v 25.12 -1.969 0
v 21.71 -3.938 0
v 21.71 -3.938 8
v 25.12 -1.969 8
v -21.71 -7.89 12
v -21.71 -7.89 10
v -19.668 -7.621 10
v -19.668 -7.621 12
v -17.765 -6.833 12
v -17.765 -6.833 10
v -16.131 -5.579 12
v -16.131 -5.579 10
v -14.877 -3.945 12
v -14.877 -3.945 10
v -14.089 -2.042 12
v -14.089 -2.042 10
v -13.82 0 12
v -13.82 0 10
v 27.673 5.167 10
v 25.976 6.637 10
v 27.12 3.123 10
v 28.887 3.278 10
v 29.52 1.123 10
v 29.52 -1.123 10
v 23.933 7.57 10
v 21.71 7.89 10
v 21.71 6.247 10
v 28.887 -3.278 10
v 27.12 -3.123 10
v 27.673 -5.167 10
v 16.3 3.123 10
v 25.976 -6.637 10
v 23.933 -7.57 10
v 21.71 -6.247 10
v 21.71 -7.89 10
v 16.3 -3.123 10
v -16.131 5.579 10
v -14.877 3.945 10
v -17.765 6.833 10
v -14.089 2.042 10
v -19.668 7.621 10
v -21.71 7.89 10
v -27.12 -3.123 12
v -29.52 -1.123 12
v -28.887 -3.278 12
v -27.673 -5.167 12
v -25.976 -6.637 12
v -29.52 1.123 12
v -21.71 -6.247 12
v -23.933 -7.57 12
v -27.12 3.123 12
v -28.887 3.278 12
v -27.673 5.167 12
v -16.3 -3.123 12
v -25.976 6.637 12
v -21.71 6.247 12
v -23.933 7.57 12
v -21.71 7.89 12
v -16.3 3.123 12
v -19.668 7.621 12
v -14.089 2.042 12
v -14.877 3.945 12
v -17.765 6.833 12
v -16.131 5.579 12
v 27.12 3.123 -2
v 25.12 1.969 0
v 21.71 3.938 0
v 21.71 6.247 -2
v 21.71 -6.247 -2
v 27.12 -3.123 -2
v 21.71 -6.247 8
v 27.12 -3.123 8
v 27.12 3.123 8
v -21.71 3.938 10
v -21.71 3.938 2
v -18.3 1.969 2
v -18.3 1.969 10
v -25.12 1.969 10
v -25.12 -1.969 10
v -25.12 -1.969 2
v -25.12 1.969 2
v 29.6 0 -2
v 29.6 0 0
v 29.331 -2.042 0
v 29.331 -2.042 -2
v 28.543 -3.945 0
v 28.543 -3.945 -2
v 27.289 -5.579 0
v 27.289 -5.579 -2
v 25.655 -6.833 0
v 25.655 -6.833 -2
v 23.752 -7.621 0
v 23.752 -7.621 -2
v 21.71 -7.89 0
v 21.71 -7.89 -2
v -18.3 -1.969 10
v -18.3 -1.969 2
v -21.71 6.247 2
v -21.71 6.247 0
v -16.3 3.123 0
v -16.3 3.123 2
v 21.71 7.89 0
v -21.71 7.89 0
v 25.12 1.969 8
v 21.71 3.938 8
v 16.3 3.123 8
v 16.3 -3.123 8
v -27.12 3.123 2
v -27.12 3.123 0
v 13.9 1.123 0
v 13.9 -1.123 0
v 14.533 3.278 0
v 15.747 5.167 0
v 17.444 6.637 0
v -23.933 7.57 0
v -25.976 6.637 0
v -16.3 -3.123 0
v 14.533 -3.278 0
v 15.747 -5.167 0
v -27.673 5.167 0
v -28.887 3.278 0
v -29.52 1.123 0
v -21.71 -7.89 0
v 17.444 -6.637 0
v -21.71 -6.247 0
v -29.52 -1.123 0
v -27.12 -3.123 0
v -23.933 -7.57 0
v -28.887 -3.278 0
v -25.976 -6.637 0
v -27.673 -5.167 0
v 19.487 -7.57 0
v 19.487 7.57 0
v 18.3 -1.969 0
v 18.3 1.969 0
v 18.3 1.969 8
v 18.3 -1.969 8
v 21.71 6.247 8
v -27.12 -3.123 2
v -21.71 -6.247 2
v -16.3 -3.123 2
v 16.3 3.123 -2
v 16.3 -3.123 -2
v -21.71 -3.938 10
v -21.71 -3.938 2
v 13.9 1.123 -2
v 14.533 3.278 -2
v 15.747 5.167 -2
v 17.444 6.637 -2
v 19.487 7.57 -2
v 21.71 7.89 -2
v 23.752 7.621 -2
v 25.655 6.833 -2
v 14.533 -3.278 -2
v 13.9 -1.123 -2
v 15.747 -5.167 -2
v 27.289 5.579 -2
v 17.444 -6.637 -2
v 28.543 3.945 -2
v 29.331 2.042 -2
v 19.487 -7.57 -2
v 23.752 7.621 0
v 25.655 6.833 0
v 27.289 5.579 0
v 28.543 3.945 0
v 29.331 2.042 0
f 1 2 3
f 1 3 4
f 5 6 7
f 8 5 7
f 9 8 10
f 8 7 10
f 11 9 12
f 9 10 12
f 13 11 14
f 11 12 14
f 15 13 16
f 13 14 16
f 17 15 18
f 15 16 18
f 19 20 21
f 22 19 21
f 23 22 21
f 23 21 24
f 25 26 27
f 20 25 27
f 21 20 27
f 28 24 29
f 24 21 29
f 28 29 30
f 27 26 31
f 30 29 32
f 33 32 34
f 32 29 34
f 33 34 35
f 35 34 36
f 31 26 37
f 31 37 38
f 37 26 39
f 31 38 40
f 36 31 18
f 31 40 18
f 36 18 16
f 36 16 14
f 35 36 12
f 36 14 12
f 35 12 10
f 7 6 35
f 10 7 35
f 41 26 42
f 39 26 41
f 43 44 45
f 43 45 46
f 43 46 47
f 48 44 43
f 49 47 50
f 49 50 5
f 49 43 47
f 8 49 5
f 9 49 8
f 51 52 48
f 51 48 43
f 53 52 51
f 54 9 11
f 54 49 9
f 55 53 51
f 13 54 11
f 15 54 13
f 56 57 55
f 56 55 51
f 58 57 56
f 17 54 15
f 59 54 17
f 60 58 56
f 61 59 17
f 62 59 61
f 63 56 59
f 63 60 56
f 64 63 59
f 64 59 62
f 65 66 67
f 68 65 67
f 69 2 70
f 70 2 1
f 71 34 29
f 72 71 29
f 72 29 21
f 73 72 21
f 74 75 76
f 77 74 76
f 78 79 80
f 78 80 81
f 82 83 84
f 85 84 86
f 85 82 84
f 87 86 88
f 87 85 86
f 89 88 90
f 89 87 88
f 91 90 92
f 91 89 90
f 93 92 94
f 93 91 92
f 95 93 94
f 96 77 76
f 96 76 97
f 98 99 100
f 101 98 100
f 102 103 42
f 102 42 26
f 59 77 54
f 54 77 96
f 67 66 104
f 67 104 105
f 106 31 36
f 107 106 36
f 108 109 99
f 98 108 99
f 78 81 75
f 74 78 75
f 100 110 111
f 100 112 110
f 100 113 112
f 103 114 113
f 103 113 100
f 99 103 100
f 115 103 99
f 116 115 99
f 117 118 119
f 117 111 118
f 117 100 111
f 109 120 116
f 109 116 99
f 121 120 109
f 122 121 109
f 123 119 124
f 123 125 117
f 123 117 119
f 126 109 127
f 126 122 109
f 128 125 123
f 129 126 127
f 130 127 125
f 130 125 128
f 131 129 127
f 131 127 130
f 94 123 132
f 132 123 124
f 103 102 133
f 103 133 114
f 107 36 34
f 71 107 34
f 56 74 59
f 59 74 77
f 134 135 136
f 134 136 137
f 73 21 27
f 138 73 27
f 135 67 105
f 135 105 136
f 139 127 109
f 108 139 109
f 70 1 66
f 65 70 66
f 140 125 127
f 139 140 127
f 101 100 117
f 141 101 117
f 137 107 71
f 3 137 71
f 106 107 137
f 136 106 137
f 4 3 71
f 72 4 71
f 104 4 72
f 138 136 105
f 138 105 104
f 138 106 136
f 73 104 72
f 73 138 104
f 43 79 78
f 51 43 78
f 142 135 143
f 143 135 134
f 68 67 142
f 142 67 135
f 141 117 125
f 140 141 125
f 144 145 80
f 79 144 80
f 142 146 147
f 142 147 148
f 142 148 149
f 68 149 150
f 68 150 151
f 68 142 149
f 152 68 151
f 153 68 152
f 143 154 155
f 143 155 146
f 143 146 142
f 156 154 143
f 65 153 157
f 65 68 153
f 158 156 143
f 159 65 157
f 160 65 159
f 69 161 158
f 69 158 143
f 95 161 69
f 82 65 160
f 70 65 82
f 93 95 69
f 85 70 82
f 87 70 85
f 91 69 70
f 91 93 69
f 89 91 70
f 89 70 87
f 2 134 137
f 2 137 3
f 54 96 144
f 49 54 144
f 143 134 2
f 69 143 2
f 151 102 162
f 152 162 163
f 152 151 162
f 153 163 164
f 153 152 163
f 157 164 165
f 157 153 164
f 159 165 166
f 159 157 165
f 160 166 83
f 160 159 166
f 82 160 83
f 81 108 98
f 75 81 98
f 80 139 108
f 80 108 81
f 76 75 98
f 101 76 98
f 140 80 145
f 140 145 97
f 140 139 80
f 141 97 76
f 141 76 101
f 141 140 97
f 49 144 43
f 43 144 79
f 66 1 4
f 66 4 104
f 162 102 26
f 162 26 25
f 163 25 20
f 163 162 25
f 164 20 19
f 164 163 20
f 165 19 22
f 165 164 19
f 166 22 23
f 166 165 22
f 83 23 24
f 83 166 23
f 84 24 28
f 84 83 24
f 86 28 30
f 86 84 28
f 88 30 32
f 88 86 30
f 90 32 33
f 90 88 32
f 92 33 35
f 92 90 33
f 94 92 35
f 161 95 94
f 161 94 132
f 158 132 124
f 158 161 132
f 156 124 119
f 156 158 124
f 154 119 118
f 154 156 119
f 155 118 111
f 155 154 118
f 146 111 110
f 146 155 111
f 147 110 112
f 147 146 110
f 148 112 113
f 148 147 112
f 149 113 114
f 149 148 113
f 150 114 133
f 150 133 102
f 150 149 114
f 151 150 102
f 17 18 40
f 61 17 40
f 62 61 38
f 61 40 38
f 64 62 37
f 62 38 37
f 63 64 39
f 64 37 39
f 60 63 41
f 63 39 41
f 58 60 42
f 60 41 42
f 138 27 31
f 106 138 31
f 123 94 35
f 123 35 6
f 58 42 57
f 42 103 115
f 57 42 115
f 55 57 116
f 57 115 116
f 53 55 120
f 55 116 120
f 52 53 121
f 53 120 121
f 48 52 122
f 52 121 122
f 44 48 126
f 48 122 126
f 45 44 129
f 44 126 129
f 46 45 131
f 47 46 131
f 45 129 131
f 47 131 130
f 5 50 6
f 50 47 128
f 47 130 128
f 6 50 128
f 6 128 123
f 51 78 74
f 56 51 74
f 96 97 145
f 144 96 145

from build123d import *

# Parameters (mm, degrees)
BOSS_EXTRU_1_DEPTH      = 10
BOSS_EXTRU_3_START      = 2
BOSS_EXTRU_3_DEPTH      = 2
BOSS_EXTRU_4_DEPTH      = 2
ENL_V_MAT_EXTRU_2_DEPTH = 2
ENL_V_MAT_EXTRU_3_DEPTH = 2
CHANFREIN1_SIZE         = 2


with BuildPart() as part:
    # Esquisse1 → Boss.-Extru.1 (new body)
    with BuildSketch(Plane(origin=(0, 0, 0), x_dir=(0, 1, 0), z_dir=(0, 0, 1))):
        with BuildLine():
            Line((-7.89, -21.71), (-7.89, 21.71))
            ThreePointArc((-7.89, 21.71), (0, 29.6), (7.89, 21.71))
            Line((7.89, 21.71), (7.89, -21.71))
            ThreePointArc((7.89, -21.71), (0, -29.6), (-7.89, -21.71))
        make_face()
        Polygon((-1.968764418, -18.3), (-3.937528836, -21.71), (-1.968764418, -25.12), (1.968764418, -25.12), (3.937528836, -21.71), (1.968764418, -18.3), align=None, mode=Mode.SUBTRACT)
        Polygon((1.968764418, 18.3), (-1.968764418, 18.3), (-3.937528836, 21.71), (-1.968764418, 25.12), (1.968764418, 25.12), (3.937528836, 21.71), align=None, mode=Mode.SUBTRACT)
    extrude(amount=BOSS_EXTRU_1_DEPTH)

    # Esquisse3 → Boss.-Extru.3 (add)
    with BuildSketch(Plane(origin=(0, 0, 0), x_dir=(1, 0, 0), z_dir=(0, 0, -1)).offset(BOSS_EXTRU_3_START)):
        with BuildLine():
            ThreePointArc((21.71, -7.89), (27.289072504, -5.579072504), (29.6, 0))
            ThreePointArc((29.6, 0), (27.289072504, 5.579072504), (21.71, 7.89))
            ThreePointArc((21.71, 7.89), (13.82, 0), (21.71, -7.89))
        make_face()
        Polygon((21.71, -3.937528836), (18.3, -1.968764418), (18.3, 1.968764418), (21.71, 3.937528836), (25.12, 1.968764418), (25.12, -1.968764418), align=None, mode=Mode.SUBTRACT)
    extrude(amount=-BOSS_EXTRU_3_DEPTH)

    # Esquisse4 → Boss.-Extru.4 (add)
    with BuildSketch(Plane.XY.offset(10)):
        with BuildLine():
            ThreePointArc((-21.71, -7.89), (-16.130927496, -5.579072504), (-13.82, 0))
            ThreePointArc((-13.82, 0), (-16.130927496, 5.579072504), (-21.71, 7.89))
            ThreePointArc((-21.71, 7.89), (-29.6, 0), (-21.71, -7.89))
        make_face()
        Polygon((-25.12, -1.968764418), (-25.12, 1.968764418), (-21.71, 3.937528836), (-18.3, 1.968764418), (-18.3, -1.968764418), (-21.71, -3.937528836), align=None, mode=Mode.SUBTRACT)
    extrude(amount=BOSS_EXTRU_4_DEPTH)

    # Esquisse5 → Enlèv. mat.-Extru.2 (cut)
    with BuildSketch(Plane(origin=(0, 0, 0), x_dir=(1, 0, 0), z_dir=(0, 0, -1))):
        Polygon((-16.3, -3.123464956), (-16.3, 3.123464956), (-21.71, 6.246929913), (-27.12, 3.123464956), (-27.12, -3.123464956), (-21.71, -6.246929913), align=None)
    extrude(amount=-ENL_V_MAT_EXTRU_2_DEPTH, mode=Mode.SUBTRACT)

    # Esquisse6 → Enlèv. mat.-Extru.3 (cut)
    with BuildSketch(Plane.XY.offset(10)):
        Polygon((27.12, -3.123464956), (27.12, 3.123464956), (21.71, 6.246929913), (16.3, 3.123464956), (16.3, -3.123464956), (21.71, -6.246929913), align=None)
    extrude(amount=-ENL_V_MAT_EXTRU_3_DEPTH, mode=Mode.SUBTRACT)

    # Chanfrein1
    chanfrein1_edges = [part.edges().sort_by_distance(p)[0] for p in [
        (20.005, 2.953146627, -2),
        (18.3, 0, -2),
        (20.005, -2.953146627, -2),
        (23.415, -2.953146627, -2),
        (25.12, 0, -2),
        (23.415, 2.953146627, -2),
        (-25.12, 0, 12),
        (-23.415, 2.953146627, 12),
        (-20.005, 2.953146627, 12),
        (-18.3, 0, 12),
        (-20.005, -2.953146627, 12),
        (-23.415, -2.953146627, 12),
    ]]
    chamfer(chanfrein1_edges, length=CHANFREIN1_SIZE - 0.0001)  # a hair under: the kernel refuses the full size


solid = part.part
